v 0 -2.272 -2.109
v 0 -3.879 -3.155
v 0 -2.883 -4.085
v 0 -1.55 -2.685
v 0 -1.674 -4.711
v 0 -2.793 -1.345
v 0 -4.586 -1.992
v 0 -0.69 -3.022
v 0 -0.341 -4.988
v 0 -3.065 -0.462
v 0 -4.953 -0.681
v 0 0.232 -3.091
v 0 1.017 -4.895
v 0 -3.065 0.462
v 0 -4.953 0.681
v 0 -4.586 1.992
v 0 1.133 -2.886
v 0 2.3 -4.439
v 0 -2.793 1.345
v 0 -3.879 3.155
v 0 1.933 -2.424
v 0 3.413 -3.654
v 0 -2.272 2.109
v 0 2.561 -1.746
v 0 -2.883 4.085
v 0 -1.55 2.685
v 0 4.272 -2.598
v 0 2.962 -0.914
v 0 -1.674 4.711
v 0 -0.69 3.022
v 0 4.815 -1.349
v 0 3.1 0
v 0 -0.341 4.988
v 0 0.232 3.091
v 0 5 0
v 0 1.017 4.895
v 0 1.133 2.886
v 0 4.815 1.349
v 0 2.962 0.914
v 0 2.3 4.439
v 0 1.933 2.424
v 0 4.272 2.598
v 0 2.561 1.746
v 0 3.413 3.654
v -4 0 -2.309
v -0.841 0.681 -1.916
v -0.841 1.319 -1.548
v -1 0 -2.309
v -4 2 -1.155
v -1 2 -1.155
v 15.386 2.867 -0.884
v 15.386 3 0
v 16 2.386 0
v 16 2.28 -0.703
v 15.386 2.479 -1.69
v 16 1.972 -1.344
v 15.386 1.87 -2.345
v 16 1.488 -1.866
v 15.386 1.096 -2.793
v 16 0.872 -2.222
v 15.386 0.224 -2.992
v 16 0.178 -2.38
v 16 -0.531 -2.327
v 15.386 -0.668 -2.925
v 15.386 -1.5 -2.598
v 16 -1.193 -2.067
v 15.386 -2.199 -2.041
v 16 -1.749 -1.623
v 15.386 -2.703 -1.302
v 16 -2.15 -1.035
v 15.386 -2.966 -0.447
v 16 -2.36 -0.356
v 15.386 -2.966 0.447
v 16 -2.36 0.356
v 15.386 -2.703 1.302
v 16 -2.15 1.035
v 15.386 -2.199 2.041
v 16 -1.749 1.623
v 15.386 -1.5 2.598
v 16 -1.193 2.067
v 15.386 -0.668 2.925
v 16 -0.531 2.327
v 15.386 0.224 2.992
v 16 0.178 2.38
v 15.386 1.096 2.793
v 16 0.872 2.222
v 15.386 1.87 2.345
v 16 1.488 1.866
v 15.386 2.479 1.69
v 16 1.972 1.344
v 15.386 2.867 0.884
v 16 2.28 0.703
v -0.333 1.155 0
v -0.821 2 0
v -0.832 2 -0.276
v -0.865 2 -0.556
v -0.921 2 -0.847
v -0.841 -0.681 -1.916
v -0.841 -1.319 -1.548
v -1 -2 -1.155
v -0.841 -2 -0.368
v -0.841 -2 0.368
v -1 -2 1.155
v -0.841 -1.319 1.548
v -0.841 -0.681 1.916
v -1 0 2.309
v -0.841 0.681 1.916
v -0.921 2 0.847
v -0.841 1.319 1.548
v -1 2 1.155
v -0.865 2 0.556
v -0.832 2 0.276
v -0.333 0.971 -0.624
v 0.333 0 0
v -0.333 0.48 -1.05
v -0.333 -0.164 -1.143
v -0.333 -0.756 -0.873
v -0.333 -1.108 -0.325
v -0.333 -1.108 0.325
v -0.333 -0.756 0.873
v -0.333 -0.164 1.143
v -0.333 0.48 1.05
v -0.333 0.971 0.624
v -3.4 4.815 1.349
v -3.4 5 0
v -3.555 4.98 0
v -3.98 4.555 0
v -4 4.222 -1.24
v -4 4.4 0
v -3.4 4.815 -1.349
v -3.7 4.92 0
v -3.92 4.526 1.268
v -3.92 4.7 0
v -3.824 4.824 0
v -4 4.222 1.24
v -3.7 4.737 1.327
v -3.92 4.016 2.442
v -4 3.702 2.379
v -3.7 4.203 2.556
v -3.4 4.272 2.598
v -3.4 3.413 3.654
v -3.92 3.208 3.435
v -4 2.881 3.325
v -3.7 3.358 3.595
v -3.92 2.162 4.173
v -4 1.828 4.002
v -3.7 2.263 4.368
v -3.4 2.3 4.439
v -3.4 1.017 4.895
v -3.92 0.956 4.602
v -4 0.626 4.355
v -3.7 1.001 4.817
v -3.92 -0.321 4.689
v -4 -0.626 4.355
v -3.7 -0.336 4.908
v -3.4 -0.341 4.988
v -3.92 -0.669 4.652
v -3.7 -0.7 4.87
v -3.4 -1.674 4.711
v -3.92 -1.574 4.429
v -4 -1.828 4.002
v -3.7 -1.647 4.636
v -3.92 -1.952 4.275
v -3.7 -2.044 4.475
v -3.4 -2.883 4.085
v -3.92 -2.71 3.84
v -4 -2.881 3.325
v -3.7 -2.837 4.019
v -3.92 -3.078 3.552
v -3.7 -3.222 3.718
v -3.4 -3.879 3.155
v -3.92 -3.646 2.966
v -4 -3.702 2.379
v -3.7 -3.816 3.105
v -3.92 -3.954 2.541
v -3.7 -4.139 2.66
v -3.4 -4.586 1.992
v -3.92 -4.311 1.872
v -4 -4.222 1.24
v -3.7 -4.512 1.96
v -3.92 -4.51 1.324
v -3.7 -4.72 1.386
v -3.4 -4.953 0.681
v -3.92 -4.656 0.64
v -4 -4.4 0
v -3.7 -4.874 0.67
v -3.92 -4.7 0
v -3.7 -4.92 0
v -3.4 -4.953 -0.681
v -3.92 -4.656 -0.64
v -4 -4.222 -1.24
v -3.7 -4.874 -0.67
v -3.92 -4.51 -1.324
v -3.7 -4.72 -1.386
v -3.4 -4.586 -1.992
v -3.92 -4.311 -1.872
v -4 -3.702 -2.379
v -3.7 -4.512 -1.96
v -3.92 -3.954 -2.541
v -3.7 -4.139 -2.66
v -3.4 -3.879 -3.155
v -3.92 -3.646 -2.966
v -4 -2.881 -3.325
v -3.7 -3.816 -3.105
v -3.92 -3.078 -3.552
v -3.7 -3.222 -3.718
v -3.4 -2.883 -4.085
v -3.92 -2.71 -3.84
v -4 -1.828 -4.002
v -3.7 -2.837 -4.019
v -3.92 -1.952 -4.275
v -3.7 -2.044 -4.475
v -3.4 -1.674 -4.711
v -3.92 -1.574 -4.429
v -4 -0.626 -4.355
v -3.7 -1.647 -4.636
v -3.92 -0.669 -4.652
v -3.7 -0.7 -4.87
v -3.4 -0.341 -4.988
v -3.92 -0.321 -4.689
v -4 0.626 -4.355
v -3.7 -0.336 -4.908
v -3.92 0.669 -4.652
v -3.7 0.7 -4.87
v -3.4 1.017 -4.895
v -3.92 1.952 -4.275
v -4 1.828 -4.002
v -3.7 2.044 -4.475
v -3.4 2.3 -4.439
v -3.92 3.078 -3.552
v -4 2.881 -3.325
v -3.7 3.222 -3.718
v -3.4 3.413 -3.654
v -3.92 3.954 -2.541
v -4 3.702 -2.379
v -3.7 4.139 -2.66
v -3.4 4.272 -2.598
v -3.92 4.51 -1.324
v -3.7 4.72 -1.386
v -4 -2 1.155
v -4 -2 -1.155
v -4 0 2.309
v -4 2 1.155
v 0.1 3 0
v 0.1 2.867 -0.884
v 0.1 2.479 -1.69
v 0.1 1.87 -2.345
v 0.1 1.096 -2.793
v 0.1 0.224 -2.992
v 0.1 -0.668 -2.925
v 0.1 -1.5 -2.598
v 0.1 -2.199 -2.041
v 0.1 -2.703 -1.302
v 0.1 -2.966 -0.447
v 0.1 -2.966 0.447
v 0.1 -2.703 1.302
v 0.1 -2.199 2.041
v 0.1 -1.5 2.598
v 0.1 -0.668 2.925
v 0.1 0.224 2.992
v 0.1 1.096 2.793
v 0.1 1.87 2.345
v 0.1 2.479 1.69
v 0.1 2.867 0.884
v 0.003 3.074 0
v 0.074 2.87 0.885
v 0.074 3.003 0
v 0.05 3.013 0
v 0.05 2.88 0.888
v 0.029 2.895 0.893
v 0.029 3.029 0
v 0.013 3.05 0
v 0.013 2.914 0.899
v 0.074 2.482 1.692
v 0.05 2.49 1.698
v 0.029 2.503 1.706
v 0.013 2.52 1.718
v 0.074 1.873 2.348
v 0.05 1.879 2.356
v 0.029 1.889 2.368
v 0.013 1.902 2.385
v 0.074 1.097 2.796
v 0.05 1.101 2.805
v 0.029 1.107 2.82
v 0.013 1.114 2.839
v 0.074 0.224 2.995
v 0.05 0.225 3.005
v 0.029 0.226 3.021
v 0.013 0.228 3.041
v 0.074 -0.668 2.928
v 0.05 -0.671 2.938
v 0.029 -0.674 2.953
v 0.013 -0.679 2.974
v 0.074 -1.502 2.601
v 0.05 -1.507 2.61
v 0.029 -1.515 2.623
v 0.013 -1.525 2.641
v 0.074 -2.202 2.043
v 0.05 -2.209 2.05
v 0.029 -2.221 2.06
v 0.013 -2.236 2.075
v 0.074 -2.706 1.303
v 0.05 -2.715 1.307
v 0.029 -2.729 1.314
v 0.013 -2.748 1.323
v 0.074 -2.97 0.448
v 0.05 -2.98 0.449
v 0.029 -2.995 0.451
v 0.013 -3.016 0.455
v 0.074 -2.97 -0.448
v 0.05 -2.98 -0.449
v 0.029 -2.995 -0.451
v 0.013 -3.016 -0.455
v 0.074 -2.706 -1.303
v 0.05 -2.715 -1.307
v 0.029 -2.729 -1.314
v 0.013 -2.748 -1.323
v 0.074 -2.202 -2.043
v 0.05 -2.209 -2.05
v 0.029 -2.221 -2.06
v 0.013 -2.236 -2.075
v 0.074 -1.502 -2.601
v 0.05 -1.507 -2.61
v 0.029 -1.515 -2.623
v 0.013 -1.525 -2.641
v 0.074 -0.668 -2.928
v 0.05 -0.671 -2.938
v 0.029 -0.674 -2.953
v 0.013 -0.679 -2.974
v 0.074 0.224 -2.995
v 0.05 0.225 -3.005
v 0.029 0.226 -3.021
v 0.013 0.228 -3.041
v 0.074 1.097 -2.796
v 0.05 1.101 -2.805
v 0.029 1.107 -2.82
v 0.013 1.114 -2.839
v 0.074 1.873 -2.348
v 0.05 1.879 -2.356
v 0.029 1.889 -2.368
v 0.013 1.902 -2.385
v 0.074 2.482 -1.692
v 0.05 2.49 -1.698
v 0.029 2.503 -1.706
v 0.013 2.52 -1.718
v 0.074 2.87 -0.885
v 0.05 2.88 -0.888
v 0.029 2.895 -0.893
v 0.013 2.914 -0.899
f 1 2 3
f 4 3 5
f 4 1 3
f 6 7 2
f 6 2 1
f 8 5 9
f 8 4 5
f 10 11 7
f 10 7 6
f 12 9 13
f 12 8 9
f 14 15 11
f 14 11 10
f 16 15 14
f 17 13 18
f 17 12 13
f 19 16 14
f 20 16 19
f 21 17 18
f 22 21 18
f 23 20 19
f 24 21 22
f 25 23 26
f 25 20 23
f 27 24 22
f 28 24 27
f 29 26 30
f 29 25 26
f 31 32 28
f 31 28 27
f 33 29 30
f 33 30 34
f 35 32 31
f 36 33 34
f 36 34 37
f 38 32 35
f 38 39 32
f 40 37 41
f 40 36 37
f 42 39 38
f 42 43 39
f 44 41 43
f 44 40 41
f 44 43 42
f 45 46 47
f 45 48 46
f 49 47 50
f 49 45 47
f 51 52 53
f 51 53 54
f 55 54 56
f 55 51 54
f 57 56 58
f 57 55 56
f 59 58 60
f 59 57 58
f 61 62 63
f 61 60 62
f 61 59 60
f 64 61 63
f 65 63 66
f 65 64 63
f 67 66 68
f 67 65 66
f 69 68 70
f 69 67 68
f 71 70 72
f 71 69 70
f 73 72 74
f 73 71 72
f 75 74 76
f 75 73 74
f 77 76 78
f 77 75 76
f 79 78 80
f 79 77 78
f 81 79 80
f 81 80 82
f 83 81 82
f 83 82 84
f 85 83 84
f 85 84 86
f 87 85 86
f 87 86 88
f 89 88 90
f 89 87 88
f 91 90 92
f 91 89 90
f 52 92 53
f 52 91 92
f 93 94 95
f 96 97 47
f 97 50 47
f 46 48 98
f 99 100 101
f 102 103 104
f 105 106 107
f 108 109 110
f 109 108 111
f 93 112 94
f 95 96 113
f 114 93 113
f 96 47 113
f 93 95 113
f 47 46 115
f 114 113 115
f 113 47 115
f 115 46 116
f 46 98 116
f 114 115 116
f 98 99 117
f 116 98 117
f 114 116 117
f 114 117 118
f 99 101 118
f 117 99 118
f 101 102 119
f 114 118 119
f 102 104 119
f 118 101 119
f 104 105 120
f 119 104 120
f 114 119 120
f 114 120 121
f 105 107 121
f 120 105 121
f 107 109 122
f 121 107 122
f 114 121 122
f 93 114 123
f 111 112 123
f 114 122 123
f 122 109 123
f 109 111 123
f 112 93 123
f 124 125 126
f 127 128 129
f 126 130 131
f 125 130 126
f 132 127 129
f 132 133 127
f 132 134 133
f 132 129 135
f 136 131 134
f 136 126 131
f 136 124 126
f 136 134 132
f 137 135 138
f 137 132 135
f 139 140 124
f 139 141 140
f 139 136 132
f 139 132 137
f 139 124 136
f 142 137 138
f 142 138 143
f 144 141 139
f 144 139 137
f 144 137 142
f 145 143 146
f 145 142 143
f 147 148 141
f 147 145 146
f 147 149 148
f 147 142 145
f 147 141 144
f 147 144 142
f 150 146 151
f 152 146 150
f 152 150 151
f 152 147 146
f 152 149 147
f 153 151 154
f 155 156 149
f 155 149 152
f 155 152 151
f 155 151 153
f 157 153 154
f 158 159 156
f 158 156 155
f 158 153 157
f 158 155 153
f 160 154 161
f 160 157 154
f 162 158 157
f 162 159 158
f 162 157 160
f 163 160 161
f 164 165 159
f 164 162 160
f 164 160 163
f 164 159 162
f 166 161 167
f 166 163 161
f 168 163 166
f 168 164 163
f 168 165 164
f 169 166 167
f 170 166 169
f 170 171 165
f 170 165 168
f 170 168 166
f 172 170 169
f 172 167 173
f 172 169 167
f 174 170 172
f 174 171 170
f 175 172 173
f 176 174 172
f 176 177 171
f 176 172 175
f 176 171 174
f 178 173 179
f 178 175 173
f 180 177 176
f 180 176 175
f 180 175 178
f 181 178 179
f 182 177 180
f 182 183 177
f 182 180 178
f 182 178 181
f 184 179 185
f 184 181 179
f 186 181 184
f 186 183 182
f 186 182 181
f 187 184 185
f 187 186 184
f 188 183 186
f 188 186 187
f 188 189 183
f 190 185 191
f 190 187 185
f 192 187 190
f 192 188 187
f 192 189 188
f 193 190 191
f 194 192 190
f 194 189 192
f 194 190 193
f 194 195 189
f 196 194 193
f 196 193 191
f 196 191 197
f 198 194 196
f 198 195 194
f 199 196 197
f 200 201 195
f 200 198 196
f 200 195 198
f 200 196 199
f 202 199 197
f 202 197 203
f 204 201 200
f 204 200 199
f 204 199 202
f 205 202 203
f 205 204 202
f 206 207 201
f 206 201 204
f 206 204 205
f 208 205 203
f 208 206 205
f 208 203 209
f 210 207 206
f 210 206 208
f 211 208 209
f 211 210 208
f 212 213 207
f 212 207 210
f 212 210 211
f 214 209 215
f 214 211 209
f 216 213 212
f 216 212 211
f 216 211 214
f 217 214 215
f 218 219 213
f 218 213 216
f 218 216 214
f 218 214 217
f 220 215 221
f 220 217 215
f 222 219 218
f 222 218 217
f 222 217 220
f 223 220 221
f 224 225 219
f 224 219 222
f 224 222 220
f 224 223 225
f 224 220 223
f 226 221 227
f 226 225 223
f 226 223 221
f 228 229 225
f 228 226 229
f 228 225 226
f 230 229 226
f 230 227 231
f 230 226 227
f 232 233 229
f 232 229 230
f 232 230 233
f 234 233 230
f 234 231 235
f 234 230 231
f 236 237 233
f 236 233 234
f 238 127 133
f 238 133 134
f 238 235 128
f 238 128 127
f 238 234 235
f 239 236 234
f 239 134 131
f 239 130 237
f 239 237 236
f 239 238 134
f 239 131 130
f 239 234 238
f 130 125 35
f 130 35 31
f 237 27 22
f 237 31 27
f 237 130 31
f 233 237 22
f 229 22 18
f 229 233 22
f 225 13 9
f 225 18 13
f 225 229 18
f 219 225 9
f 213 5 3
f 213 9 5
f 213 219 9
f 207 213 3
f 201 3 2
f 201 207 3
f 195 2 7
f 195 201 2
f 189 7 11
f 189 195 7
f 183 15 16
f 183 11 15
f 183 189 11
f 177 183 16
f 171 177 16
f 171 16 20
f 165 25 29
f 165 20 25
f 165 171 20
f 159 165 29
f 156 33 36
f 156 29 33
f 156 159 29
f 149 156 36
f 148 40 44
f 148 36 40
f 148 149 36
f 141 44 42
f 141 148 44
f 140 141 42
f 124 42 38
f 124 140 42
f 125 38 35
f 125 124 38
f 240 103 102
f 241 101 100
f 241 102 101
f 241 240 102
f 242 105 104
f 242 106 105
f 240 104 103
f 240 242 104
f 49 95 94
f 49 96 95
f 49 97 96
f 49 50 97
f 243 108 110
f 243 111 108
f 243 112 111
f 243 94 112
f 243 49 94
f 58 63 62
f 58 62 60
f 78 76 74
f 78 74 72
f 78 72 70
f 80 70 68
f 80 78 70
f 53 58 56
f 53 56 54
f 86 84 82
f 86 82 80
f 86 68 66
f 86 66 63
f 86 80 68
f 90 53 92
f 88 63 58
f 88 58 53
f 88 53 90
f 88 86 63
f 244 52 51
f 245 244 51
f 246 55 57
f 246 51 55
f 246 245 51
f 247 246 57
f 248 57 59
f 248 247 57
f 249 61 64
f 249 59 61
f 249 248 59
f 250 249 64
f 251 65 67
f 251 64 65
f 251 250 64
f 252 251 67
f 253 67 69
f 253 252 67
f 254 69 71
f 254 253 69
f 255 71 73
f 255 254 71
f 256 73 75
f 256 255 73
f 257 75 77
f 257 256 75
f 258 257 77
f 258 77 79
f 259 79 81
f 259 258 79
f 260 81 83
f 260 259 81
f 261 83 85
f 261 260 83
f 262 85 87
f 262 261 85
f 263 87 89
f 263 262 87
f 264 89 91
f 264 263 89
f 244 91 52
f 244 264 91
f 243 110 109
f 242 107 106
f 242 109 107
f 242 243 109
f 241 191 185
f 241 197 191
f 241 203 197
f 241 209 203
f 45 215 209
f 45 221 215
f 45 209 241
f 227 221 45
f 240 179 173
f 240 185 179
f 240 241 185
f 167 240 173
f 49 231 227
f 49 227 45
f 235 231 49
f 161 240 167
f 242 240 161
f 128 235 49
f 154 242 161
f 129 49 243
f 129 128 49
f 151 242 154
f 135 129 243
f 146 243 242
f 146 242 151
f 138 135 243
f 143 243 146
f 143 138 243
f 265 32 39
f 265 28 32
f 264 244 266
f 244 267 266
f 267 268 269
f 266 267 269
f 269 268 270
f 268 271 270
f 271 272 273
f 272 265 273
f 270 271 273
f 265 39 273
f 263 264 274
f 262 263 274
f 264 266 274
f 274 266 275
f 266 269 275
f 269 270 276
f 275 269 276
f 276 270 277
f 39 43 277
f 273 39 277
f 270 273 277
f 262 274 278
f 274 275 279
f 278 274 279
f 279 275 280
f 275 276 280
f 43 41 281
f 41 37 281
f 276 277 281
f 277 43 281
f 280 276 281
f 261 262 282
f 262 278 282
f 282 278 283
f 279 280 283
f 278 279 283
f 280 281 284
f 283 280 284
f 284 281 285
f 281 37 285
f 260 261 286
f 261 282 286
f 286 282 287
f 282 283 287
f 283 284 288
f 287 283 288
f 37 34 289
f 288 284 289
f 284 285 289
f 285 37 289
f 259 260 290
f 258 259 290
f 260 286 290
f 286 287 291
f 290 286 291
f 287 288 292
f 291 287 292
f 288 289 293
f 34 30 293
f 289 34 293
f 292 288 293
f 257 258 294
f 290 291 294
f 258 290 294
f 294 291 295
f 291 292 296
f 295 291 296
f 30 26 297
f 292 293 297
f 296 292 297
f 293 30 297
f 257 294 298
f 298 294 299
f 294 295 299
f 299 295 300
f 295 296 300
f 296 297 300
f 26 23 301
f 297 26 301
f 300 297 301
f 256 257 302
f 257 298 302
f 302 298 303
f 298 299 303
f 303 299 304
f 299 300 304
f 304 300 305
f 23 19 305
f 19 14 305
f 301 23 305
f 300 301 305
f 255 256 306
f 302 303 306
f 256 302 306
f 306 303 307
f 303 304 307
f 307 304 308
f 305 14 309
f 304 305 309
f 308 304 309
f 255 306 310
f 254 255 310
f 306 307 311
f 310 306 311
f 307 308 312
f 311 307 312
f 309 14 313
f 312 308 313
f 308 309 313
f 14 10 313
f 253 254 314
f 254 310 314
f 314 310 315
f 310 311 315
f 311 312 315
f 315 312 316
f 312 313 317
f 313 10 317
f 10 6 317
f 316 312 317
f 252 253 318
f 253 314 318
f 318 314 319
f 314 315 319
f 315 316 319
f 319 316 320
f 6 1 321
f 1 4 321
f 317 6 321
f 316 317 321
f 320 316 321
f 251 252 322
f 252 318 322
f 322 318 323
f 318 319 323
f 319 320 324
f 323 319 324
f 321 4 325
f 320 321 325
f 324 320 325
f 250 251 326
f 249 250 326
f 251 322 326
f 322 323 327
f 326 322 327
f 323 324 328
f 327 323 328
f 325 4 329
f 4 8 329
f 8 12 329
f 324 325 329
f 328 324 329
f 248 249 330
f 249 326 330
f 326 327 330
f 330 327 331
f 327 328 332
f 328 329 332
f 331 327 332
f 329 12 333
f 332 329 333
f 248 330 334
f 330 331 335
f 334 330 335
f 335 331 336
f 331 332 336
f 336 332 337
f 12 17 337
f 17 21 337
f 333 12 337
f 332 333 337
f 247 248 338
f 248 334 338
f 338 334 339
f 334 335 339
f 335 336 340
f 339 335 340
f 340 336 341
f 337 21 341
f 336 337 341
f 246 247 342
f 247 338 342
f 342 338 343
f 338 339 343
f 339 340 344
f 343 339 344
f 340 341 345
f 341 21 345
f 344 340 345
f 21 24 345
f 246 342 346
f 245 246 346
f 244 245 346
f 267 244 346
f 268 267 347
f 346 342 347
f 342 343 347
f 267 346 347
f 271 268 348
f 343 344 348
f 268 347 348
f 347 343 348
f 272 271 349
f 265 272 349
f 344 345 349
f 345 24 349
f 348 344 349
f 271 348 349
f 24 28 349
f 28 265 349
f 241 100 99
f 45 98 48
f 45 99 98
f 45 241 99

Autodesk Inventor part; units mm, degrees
ref_plane "YZ Plane" through (0, 0, 0) normal (1, 0, 0) x (0, 1, 0)
ref_plane "XZ Plane" through (0, 0, 0) normal (0, 1, 0) x (-1, 0, 0)
sketch "Sketch1" plane through (0, 0, 0) normal (0, 0, 1) x (1, 0, 0)
  line L0 (0.3333, 0) -> (16, 0)
  line L1 (16, 0) -> (16, 3)
  line L2 (16, 3) -> (3, 3)
  line L3 (3, 3) -> (2.3864, 3)
  line L4 (2.3864, 3) -> (0, 3)
  line L5 (0, 3) -> (0, 5)
  line L6 (0, 5) -> (-4, 5)
  line L7 (-4, 5) -> (-4, 2.3094)
  line L8 (-4, 2.3094) -> (-1, 2.3094)
  line L9 (-1, 2.3094) -> (0.3333, 0)
  line L10 (-8, 0) -> (20, 0) projected
  line L11 (0, -1) -> (0, 6) projected
  line L12 (3, 3) -> (0, 3) construction
  dimension "d1" = 13
  dimension "d2" = 0.6136
  dimension "d3" = 4
  dimension "d4" = 3
  dimension "d5" = 60
  dimension "d6" = 6
  dimension "d7" = 6
  dimension "d8" = 4.6188
  dimension "d9" = 10
  dimension "d26" = 16
revolve "Body" add sketch "Sketch1" angle 360 about axis through (0.3333, 0, 0) along (1, 0, 0) contours L9 L11 L4 L3 L2 L1 L0 | L9 L8 L7 L6 L5 L11
sketch "Sketch2" plane through (-4, 0, 0) normal (-1, 0, 0) x (0, 0, 1)
  circle A0 centre (0, 0) radius 2.3094 projected
  line L0 (0, -7) -> (0, 7) projected
  line L1 (-7, 0) -> (7, 0) projected
  line L2 (2.3094, 0) -> (1.1547, -2)
  line L3 (1.1547, -2) -> (-1.1547, -2)
  line L4 (-1.1547, -2) -> (-2.3094, 0)
  line L5 (-2.3094, 0) -> (-1.1547, 2)
  line L6 (-1.1547, 2) -> (1.1547, 2)
  line L7 (1.1547, 2) -> (2.3094, 0)
extrude "Slot" add sketch "Sketch2" against normal up to next contours L7 A0 | A0 L2 | L6 L0 A0 | A0 L0 L3 | L0 L6 A0 | A0 L3 L0 | L4 A0 | A0 L5
fillet "Fillet1" radius 0.6 1 edges at (-4, -5, 0)
thread "Thread" size "M6x1" class "6g" standard "ISO Metric profile" length 13
chamfer "Chamfer1" distance 0.6135 distance2 0.6135 1 edges at (16, -3, 0) measured on face at (16, -1.1424, 0.935)
ref_plane "Work Plane1" through (29, 0, 0) normal (0, -1, 0) x (1, 0, 0)
fillet "Fillet2" radius 0.1 1 edges at (0, -3, 0)
equation "\"d1\" = GEL"
equation "\"d3\" = KOH"
equation "\"d4\" = INTI"
equation "\"d6\" = GD"
equation "\"d7\" = BDM"
equation "\"d8\" = 1.1547 * SW"
equation "\"d9\" = KOD"
equation "\"d26\" = NLG"
equation "\"d30\" = R"
equation "\"d17\" = RR"
equation "\"d13\" = GEL"
equation "\"d15\" = -0.5 * SPD + 0.5 * GD"
equation "\"d16\" = GUL"
equation "\"GD\" = NND"
equation "\"NLG\" = 16"
equation "\"GEL\" = 13"
equation "\"KOD\" = 10"
equation "\"KOH\" = 4"
equation "\"INTI\" = 3"
equation "\"GAL\" = 0.61345 * PTC"
equation "\"GUL\" = 0.61345 * PTC"
equation "\"BDM\" = NND"
equation "\"SW\" = 4"
equation "\"RR\" = 0.6"
equation "\"SPD\" = NND - 1.2269 * PTC"
equation "\"R\" = 0.1"
equation "\"TOA\" = 30deg"
equation "\"GD1\" = THREADDIA - 1.2269 * PTC"
equation "\"THREADDIA\" = 6"
equation "\"FAWI\" = 45deg"
equation "\"ANG\" = 120deg"
equation "\"PTC\" = 1"
equation "\"NND\" = 6"
equation "\"E0\" = 1.155 * SW"
properties part number "DIN 7984 - M6 x 16" material "Steel, Mild"
